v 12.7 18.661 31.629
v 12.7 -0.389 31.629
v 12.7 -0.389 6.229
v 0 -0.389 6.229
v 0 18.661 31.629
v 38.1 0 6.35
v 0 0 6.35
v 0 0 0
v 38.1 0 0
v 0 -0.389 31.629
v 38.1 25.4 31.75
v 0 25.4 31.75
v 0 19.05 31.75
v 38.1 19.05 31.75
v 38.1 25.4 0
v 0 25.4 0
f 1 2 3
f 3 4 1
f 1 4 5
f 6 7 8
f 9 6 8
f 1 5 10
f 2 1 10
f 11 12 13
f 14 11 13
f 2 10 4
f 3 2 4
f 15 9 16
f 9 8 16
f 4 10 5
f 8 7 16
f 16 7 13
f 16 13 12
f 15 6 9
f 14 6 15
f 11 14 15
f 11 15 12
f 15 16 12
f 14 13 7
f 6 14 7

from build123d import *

# Parameters (mm, degrees)
F1_DEPTH = 25.4
F3_DEPTH = 12.7
F4_DEPTH = 12.7


with BuildPart() as f1:
    # F0 (on Right) → F1 (new body)
    with BuildSketch(Plane.YZ):
        Polygon((0, 6.35), (0, 0), (25.4, 0), (25.4, 31.75), (19.05, 31.75), align=None)
    extrude(amount=F1_DEPTH)

    # F1_face (on face) → F4 (join)
    with BuildSketch(Plane(origin=(25.4, 15.421429, 12.7), x_dir=(0, 1, 0), z_dir=(1, 0, 0))):
        Polygon((-15.421429, -6.35), (-15.421429, -12.7), (9.978571, -12.7), (9.978571, 19.05), (3.628571, 19.05), align=None)
    extrude(amount=F4_DEPTH)


with BuildPart() as f3:
    # F2 (on Right) → F3 (new body)
    with BuildSketch(Plane.YZ):
        Polygon((-0.389343, 31.629489), (-0.389343, 6.229489), (18.660657, 31.629489), align=None)
    extrude(amount=F3_DEPTH)


solid = Compound([f1.part, f3.part])
